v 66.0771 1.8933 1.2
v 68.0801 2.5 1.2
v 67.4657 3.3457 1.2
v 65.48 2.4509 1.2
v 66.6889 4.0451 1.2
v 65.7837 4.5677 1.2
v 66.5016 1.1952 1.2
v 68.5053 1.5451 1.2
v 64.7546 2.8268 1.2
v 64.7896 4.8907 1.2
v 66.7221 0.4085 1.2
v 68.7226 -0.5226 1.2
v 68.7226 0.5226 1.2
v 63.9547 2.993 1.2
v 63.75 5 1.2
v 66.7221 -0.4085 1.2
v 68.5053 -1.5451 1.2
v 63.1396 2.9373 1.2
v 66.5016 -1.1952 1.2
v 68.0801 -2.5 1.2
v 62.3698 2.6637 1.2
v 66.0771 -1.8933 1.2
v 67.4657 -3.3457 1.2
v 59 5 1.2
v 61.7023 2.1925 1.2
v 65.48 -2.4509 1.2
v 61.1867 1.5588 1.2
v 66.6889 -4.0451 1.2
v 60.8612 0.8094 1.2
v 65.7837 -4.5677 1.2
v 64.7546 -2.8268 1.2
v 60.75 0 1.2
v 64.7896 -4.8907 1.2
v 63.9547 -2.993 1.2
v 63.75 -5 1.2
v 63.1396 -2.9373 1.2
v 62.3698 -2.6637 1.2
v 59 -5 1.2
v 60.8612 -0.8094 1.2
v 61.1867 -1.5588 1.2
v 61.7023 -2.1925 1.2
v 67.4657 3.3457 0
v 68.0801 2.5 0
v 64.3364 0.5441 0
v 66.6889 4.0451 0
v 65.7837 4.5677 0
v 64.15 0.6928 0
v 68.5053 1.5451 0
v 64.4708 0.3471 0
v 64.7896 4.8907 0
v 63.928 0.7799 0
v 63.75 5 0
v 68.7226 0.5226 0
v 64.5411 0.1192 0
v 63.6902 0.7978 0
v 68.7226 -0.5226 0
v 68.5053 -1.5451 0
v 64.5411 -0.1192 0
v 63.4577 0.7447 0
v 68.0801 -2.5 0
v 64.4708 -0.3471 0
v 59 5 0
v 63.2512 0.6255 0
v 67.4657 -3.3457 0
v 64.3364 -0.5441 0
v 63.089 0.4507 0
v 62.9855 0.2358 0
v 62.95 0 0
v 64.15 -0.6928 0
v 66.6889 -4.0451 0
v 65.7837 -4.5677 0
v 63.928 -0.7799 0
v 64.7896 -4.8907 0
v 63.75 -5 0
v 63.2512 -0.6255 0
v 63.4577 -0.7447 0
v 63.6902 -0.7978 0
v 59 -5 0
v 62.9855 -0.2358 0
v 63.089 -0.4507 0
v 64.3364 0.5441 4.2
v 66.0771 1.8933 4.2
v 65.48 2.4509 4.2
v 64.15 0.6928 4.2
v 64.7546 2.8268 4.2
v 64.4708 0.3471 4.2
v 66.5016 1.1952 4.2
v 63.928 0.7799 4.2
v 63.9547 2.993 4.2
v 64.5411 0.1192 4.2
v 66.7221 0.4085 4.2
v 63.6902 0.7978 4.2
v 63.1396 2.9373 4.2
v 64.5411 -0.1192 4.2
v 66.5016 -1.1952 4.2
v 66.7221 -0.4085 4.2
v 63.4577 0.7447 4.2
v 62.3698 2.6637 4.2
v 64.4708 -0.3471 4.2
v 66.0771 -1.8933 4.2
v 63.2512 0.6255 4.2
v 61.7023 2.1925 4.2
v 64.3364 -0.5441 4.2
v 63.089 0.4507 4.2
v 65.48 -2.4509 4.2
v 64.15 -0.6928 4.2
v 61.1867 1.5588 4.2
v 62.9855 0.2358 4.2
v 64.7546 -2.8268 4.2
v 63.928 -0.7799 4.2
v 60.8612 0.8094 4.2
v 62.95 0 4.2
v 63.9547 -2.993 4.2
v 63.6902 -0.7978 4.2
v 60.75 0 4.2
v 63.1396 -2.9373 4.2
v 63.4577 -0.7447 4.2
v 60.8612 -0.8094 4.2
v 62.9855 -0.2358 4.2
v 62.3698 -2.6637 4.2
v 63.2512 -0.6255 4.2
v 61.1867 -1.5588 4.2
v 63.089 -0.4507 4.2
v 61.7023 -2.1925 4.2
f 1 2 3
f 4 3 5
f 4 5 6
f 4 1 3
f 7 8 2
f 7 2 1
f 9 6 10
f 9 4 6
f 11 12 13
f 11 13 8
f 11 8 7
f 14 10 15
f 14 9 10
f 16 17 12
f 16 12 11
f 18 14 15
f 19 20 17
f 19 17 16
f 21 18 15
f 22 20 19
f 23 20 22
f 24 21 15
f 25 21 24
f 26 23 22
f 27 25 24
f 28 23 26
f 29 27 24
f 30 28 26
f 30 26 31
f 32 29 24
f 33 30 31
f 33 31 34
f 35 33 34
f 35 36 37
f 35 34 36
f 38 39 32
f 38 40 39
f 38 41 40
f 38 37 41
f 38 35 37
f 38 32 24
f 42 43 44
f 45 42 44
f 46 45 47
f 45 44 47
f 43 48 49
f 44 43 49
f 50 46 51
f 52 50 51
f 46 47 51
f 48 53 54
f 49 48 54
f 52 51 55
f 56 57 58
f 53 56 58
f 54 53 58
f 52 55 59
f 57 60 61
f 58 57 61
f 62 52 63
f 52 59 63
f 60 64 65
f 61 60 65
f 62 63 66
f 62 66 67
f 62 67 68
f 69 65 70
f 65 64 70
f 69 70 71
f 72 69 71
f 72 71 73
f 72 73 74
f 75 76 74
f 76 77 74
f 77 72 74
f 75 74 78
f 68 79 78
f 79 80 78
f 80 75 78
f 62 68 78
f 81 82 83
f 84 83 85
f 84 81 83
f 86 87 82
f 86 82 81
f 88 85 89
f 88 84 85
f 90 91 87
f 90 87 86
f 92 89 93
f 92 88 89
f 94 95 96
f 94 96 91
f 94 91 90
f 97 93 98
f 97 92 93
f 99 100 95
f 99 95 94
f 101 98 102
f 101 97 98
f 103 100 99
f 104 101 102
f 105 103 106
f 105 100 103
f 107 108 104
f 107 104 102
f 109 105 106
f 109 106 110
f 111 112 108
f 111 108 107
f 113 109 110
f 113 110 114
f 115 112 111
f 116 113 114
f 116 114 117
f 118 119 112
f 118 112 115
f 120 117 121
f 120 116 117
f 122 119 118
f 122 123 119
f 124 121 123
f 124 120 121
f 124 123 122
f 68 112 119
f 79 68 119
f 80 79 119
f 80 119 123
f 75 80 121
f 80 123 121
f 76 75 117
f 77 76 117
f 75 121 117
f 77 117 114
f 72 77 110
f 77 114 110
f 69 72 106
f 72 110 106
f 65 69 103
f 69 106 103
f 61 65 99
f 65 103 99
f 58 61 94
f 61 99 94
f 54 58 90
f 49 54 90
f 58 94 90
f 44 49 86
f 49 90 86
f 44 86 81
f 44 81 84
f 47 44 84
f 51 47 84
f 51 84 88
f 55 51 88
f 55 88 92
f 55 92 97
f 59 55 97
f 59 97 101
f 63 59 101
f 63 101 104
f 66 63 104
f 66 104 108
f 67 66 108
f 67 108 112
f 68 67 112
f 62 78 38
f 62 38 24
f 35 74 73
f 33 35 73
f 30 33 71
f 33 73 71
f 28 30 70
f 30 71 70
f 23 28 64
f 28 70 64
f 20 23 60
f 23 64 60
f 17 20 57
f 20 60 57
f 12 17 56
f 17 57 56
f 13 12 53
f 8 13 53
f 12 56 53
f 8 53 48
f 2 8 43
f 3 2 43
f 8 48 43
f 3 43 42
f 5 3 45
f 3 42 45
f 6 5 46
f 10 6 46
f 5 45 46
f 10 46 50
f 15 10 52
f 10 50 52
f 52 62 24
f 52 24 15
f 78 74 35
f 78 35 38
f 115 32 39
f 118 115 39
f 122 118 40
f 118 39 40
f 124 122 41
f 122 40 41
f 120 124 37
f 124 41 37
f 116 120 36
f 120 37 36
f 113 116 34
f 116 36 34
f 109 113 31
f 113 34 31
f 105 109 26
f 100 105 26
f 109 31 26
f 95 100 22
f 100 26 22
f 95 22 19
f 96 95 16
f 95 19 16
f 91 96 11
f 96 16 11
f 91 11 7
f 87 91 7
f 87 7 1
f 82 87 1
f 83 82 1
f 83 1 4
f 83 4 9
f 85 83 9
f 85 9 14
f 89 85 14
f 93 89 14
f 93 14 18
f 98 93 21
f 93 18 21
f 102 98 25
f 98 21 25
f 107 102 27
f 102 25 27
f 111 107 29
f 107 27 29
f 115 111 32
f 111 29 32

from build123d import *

# Parameters (mm, degrees)
PAD001_DEPTH          = 1.2
SKETCH002_R           = 3
PAD002_DEPTH          = 3
SKETCH003_R           = 0.8
POCKET_DEPTH          = 5
CLONE_PLACEMENT_ANGLE = 180


with BuildPart() as part:
    # Sketch001 → Pad001 (new body)
    with BuildSketch(Plane.XY):
        with BuildLine():
            ThreePointArc((-47.75, 5), (-52.75, 0), (-47.75, -5))
            Line((-43, -5), (-47.75, -5))
            Line((-43, 5), (-43, -5))
            Line((-47.75, 5), (-43, 5))
        make_face()
    extrude(amount=PAD001_DEPTH)

    # Sketch002 → Pad002 (new body)
    with BuildSketch(Plane.XY.offset(1.2)):
        with Locations((-47.75, 0)):
            Circle(SKETCH002_R)
    extrude(amount=PAD002_DEPTH)

    # Sketch003 → Pocket (cut)
    with BuildSketch(Plane.XY.offset(4.2)):
        with Locations((-47.75, 0)):
            Circle(SKETCH003_R)
    extrude(amount=-POCKET_DEPTH, mode=Mode.SUBTRACT)


with BuildPart() as part_1:
    # Clone placement: moved
    add(part.part.moved(Location((16, 0, 0))).rotate(Axis((16, 0, 0), (0, 0, 1)), CLONE_PLACEMENT_ANGLE))


solid = part_1.part
